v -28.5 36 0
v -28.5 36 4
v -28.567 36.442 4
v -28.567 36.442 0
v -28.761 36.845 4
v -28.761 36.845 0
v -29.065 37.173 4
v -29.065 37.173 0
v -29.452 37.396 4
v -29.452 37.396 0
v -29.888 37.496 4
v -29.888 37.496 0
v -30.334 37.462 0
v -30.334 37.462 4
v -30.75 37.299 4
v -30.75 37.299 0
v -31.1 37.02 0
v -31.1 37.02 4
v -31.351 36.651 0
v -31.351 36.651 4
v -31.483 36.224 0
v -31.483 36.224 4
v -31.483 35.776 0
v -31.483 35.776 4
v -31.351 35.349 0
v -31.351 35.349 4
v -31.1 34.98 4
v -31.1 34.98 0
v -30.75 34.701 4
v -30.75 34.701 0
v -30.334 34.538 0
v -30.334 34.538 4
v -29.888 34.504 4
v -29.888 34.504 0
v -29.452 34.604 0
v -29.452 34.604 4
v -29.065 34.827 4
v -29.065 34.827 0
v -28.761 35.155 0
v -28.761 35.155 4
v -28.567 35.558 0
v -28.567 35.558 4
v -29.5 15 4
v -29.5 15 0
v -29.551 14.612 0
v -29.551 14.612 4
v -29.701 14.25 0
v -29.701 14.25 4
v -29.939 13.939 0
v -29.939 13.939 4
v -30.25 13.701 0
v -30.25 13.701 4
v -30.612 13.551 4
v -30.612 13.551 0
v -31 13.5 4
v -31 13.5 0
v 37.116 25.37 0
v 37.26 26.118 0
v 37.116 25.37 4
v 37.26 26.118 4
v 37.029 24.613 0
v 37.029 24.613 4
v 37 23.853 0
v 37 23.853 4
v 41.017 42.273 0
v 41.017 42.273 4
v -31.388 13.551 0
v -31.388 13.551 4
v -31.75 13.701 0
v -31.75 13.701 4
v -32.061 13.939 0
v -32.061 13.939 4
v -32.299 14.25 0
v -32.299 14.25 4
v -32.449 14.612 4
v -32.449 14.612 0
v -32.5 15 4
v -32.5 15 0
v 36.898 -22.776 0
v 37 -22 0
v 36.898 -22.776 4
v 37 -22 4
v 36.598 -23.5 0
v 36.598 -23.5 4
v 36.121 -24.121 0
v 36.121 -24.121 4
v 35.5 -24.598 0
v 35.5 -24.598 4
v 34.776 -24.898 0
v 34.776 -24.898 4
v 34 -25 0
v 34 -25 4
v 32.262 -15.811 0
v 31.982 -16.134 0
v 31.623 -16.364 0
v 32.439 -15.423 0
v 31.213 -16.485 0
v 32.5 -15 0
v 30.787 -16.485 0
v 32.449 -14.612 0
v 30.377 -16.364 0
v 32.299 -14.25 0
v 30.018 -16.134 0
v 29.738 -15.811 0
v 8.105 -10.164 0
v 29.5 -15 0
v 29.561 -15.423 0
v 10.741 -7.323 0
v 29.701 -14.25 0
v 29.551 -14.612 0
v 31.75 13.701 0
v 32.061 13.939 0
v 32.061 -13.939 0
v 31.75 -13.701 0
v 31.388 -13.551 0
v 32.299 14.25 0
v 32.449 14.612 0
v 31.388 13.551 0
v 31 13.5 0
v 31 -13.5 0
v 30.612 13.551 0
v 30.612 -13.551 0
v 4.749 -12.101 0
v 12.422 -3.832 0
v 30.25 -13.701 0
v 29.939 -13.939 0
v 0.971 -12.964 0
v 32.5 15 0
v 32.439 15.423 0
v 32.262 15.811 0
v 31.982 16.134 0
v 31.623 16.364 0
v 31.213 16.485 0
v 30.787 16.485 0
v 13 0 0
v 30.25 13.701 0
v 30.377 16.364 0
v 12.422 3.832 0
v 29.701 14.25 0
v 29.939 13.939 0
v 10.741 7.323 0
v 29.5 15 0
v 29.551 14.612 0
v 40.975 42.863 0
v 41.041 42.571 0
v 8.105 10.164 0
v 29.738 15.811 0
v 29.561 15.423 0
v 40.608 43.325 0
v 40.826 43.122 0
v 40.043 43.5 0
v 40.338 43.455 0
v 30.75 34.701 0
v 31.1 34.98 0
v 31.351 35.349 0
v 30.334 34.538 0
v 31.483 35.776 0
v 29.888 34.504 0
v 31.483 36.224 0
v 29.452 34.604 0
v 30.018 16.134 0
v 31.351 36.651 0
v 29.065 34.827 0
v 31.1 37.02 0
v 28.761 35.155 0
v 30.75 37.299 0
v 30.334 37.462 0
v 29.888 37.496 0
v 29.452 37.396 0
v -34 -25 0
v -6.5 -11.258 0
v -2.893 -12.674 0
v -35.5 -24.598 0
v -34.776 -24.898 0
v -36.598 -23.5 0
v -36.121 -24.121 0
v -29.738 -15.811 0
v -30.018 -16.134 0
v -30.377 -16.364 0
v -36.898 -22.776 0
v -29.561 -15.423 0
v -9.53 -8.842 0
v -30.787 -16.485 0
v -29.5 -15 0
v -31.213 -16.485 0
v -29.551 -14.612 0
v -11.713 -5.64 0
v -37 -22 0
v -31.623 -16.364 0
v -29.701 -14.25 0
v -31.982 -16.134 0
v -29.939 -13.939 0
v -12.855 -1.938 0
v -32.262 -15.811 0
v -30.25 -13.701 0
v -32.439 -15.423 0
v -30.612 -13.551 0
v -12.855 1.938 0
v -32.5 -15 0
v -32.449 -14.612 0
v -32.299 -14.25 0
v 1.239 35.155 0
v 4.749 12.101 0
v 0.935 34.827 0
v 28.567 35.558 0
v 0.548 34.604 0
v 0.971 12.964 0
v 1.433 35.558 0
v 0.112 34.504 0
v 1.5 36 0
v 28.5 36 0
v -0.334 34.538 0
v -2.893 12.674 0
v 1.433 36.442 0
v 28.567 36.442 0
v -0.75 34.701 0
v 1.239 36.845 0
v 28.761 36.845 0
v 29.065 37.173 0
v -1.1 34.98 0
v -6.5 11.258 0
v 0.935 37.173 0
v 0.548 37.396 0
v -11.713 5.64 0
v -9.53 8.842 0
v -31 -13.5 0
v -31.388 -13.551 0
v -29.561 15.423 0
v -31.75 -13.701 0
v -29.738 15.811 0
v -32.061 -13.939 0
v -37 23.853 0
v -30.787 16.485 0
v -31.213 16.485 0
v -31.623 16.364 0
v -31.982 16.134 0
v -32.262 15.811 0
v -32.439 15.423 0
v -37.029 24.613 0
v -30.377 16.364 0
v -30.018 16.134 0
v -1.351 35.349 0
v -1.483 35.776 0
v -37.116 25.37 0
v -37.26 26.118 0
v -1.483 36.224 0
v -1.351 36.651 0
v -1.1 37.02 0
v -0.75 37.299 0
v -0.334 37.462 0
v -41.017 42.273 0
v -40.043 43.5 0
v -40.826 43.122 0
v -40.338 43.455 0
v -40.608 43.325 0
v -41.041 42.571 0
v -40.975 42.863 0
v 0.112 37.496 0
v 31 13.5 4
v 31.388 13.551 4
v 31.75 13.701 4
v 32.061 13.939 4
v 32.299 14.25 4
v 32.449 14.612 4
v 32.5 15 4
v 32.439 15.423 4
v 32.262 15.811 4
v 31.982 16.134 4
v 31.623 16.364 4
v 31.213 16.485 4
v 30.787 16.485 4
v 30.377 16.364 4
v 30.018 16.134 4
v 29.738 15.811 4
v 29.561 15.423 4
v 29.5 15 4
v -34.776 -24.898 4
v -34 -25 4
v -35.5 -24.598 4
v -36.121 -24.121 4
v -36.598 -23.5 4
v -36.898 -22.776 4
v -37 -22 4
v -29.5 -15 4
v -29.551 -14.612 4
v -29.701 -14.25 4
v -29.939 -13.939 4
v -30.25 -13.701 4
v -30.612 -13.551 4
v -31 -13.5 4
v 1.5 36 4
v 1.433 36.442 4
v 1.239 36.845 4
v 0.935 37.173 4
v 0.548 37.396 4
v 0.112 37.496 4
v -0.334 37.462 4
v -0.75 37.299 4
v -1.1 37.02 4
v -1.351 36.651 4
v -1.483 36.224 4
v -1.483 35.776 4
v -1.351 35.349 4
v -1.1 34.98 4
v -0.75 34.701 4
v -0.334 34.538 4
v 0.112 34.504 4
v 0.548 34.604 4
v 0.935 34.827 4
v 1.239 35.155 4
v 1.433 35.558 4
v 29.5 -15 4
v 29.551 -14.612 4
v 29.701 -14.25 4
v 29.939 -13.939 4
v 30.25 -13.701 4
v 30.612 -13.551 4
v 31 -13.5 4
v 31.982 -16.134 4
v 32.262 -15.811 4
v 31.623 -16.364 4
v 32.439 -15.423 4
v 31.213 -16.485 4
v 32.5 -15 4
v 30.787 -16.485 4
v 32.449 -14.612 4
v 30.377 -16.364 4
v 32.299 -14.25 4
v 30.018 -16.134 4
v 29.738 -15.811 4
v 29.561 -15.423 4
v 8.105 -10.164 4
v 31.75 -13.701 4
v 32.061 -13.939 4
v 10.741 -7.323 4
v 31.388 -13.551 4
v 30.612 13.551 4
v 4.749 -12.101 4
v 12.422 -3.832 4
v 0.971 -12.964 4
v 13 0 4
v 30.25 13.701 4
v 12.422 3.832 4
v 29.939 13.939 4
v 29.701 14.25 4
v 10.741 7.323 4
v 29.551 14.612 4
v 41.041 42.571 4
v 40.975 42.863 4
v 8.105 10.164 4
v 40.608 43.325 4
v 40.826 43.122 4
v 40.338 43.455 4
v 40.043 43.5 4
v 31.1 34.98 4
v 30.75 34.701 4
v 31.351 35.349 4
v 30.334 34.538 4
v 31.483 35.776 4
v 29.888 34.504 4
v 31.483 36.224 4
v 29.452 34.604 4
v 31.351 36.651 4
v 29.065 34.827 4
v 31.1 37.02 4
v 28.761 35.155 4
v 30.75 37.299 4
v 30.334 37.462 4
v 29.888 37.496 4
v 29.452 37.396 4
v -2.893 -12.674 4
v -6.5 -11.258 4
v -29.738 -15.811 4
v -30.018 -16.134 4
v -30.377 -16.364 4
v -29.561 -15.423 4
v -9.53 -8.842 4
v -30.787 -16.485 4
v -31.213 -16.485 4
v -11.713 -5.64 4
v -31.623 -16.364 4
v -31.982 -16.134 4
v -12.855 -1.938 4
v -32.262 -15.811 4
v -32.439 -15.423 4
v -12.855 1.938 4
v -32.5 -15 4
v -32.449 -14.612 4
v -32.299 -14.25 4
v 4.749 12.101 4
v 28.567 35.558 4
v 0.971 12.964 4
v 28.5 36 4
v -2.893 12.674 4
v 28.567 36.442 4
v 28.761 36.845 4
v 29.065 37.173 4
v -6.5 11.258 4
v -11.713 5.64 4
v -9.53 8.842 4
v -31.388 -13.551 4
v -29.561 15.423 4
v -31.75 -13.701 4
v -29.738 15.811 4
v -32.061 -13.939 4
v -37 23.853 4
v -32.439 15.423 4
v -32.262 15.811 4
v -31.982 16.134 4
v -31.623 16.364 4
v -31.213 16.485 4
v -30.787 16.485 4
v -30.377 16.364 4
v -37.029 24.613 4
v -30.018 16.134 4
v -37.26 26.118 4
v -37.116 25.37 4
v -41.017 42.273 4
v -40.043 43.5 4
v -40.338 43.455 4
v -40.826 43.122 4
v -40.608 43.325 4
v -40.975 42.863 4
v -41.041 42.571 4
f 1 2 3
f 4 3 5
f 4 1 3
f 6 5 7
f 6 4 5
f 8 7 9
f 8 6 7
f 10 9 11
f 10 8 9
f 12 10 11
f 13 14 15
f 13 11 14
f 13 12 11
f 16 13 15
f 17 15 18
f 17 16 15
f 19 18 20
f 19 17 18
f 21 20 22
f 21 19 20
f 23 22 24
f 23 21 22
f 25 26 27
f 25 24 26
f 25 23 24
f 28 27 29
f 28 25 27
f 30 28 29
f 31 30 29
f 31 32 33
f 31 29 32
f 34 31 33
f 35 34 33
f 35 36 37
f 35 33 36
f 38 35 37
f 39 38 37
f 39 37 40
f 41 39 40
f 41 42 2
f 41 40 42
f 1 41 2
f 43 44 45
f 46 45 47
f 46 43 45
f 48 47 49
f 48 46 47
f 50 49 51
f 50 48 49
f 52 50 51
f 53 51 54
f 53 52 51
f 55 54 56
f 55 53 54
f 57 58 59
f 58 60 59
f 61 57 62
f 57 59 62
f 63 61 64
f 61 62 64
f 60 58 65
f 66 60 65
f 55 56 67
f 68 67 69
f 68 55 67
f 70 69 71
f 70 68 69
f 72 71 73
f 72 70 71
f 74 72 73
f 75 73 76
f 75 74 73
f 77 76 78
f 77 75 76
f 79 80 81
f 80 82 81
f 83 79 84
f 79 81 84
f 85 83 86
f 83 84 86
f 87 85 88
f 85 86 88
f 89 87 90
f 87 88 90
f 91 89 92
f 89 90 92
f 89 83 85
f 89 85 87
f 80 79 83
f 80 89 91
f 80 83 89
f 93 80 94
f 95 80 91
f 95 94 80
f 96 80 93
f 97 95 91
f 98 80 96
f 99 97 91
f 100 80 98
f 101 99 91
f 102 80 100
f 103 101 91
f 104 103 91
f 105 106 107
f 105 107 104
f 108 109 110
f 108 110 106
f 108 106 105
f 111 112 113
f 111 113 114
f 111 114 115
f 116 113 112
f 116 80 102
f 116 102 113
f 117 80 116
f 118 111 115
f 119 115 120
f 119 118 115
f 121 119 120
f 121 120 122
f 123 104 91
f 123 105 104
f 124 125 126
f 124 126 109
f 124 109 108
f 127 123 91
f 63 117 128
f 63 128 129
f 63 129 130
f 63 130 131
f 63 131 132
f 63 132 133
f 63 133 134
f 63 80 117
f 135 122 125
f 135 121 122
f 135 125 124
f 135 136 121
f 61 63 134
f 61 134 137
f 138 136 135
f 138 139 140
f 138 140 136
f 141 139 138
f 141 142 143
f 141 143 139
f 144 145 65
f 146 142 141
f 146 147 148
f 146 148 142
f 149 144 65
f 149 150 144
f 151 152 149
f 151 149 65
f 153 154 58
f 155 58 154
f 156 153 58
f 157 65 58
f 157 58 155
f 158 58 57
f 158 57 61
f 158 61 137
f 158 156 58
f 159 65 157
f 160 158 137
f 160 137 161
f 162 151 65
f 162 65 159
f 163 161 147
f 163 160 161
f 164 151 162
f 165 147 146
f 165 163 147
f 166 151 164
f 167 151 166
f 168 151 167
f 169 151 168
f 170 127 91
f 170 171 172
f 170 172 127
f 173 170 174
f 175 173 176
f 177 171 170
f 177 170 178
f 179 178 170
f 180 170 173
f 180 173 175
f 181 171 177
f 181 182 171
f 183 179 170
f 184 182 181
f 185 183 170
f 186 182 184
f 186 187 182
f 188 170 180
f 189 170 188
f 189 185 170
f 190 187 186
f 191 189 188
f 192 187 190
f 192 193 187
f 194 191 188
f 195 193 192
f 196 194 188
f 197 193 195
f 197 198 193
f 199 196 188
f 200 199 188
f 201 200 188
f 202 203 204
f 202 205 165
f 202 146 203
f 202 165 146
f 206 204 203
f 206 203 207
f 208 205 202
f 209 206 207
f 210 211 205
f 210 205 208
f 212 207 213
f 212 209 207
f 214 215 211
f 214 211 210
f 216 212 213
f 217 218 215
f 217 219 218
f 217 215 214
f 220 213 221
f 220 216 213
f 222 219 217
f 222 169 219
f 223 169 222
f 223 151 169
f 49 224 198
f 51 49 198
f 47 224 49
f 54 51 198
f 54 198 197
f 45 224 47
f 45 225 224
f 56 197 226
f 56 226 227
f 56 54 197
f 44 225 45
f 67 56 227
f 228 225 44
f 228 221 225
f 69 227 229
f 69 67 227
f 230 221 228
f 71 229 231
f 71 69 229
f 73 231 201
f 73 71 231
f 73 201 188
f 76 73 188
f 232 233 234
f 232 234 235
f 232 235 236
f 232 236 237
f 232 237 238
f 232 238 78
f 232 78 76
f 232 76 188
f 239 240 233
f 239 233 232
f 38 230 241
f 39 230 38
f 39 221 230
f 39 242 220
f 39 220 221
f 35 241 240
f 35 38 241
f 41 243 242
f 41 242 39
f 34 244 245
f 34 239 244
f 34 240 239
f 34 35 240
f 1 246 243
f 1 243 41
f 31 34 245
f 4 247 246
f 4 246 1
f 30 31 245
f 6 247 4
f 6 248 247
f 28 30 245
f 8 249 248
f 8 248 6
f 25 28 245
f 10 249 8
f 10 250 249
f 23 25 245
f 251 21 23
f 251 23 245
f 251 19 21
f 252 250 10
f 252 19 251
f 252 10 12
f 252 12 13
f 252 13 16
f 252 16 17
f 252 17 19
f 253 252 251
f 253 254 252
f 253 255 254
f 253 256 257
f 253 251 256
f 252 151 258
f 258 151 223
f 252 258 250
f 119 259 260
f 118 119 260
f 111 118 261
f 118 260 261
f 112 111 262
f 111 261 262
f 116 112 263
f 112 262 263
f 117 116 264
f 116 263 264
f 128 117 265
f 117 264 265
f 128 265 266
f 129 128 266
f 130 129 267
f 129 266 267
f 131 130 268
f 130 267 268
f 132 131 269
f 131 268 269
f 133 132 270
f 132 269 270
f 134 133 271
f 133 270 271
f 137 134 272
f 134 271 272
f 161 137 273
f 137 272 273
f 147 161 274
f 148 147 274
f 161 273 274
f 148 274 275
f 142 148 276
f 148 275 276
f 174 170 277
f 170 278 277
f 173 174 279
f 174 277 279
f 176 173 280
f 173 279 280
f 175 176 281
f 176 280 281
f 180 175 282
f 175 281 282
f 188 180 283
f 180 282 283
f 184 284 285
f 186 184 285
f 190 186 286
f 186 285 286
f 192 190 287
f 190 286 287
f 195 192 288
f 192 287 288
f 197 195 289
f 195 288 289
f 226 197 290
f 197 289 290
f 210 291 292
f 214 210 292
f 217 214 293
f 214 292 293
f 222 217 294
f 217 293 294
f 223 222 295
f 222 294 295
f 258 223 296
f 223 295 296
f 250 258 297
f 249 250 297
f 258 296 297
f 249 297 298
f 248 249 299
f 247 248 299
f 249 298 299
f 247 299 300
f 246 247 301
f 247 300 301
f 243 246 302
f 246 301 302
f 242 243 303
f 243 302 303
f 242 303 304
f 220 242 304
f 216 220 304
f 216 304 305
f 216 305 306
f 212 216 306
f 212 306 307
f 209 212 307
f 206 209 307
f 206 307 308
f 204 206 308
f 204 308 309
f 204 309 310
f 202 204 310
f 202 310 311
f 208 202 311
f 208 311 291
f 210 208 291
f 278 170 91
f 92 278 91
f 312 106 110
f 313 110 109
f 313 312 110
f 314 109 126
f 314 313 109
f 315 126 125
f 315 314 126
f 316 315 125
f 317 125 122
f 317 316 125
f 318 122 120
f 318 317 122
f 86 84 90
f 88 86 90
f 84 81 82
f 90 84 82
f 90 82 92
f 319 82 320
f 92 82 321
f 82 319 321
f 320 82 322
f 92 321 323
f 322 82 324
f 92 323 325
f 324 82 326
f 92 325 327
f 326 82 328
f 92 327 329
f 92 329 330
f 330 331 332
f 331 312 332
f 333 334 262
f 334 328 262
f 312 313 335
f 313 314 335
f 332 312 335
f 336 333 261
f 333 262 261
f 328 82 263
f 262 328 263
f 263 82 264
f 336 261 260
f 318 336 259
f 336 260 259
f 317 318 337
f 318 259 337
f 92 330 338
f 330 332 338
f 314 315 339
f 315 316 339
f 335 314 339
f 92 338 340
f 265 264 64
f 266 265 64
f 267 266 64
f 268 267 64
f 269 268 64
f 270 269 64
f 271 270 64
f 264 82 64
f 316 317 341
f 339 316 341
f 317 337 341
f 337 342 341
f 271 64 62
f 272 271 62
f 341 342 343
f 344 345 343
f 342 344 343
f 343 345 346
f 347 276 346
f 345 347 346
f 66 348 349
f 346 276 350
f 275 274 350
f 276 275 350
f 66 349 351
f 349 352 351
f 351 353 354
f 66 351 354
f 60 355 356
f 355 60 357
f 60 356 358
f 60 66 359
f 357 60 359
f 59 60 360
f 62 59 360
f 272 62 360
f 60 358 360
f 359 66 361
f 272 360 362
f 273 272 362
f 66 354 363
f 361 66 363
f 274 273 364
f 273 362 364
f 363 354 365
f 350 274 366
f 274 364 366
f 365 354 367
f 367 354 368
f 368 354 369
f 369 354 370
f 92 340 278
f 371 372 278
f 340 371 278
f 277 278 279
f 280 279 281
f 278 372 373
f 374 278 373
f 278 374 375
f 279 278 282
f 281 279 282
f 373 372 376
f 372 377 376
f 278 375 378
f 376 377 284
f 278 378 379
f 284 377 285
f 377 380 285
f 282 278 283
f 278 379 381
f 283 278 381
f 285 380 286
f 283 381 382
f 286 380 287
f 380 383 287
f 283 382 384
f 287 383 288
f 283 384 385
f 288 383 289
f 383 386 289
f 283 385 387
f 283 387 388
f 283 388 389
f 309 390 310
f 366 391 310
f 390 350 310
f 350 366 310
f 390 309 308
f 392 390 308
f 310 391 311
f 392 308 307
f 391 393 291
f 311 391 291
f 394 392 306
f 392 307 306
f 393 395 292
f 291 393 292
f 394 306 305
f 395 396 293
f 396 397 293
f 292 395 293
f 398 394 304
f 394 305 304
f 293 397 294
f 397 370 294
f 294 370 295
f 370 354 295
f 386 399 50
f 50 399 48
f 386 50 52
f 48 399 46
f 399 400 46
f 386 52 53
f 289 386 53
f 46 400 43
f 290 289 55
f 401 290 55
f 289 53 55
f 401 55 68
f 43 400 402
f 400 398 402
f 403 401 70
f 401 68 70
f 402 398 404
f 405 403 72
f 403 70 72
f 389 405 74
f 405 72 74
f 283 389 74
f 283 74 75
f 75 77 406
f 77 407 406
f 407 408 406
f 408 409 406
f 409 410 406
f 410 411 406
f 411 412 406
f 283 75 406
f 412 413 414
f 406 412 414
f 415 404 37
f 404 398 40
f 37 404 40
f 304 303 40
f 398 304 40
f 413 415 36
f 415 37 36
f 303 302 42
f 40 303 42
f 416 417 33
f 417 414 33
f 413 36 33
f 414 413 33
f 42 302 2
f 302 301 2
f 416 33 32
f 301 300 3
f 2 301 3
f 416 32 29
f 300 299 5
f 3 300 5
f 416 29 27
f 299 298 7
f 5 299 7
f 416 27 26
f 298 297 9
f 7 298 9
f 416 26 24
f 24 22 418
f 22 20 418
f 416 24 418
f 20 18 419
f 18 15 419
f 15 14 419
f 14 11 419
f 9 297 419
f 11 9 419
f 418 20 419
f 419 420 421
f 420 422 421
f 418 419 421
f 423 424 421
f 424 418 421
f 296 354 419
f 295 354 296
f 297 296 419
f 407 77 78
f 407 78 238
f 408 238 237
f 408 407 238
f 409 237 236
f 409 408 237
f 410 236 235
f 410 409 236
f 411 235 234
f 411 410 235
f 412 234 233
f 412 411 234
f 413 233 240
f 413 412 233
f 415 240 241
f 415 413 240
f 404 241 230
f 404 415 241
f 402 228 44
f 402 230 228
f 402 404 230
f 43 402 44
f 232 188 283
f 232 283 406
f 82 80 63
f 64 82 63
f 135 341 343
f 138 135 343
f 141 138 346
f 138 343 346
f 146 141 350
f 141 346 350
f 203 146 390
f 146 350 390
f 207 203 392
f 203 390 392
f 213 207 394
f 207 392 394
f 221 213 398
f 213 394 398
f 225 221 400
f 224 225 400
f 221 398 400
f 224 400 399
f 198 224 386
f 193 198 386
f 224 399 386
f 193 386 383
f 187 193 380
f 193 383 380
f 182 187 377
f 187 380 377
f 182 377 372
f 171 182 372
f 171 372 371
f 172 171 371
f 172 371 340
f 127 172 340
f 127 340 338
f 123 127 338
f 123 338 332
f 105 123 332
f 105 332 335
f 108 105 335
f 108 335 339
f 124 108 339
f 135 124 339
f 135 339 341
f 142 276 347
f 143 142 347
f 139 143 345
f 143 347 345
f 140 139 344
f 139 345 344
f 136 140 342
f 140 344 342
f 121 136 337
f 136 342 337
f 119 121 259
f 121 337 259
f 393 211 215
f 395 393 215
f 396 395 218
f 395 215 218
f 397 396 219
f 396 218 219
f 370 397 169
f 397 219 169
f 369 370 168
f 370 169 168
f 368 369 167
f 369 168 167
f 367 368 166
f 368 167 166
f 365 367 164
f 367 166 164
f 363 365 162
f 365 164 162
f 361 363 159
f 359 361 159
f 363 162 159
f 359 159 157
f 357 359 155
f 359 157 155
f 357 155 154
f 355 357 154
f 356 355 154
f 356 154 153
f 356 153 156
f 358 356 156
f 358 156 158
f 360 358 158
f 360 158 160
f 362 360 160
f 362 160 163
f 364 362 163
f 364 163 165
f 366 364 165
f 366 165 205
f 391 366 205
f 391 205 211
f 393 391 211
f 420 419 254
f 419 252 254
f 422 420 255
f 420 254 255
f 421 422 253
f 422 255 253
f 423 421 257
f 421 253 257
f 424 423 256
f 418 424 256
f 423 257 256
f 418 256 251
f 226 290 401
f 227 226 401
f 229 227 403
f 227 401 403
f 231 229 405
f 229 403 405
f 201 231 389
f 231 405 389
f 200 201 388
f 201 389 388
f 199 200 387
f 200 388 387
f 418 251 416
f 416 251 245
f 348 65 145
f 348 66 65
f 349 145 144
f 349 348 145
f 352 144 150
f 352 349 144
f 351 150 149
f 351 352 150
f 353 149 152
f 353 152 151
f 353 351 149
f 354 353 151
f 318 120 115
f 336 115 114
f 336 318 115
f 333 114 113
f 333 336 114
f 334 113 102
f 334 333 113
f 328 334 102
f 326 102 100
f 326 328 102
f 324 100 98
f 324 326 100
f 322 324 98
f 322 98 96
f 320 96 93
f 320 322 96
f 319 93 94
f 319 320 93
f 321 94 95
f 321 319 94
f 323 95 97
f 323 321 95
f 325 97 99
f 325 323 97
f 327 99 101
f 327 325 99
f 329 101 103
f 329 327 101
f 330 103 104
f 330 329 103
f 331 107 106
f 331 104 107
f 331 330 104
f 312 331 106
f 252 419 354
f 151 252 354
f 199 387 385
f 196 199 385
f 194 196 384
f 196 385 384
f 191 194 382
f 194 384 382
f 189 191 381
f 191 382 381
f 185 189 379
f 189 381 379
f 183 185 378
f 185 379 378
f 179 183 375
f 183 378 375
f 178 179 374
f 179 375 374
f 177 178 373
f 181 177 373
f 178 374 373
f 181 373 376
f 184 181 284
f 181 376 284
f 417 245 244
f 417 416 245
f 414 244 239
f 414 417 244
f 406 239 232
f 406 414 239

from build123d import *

# Parameters (mm, degrees)
SKETCH_1_W            = 74
SKETCH_1_H            = 50
EXTRUDE_1_DEPTH       = 4
CUT_EXTRUDE_1_DEPTH   = 63.787339488
MIRROR_2_COPY_1_DEPTH = 63.787339488
SKETCH_3_R            = 13
CUT_EXTRUDE_2_DEPTH   = 63.787339488
FILLET_1_R            = 10
SKETCH_4_W            = 84
SKETCH_4_H            = 62
EXTRUDE_2_DEPTH       = 4
SKETCH_6_W            = 18
SKETCH_6_H            = 44
EXTRUDE_3_DEPTH       = 4
SKETCH_7_W            = 64
SKETCH_7_H            = 22
CUT_EXTRUDE_4_DEPTH   = 125.049385327
SKETCH_8_R            = 1.5
CUT_EXTRUDE_5_DEPTH   = 125.049385327
SKETCH_9_R            = 1.5
CUT_EXTRUDE_6_DEPTH   = 125.049385327
SKETCH_10_R           = 1.5
CUT_EXTRUDE_7_DEPTH   = 125.049385327
FILLET_2_R            = 3
SKETCH_11_W           = 20
SKETCH_11_H           = 18
CUT_EXTRUDE_8_DEPTH   = 125.049385327
FILLET_3_R            = 3
SKETCH_12_W           = 122.856865441
SKETCH_12_H           = 61.545901124
CUT_EXTRUDE_9_DEPTH   = 125.049385327
FILLET_4_R            = 3
FILLET_5_R            = 3
SKETCH_13_R           = 1.5
CUT_EXTRUDE_10_DEPTH  = 92.149602303
SKETCH_14_W           = 150.805924756
SKETCH_14_H           = 61.126695491
CUT_EXTRUDE_11_DEPTH  = 92.149602303
FILLET_6_R            = 1


with BuildPart() as part:
    # 草图1 → 凸台-拉伸1 (new body)
    with BuildSketch(Plane.XY):
        Polygon((37, 25), (42, 46.5), (-42, 46.5), (-37, 25), align=None)
        Rectangle(SKETCH_1_W, SKETCH_1_H)
    extrude(amount=EXTRUDE_1_DEPTH)

    # 草图2 → 切除-拉伸1 (cut, through all)
    with BuildSketch(Plane.XY.offset(4)):
        with BuildLine():
            ThreePointArc((29.5, 15), (29.939339828, 13.939339828), (31, 13.5))
            Line((31, 13.5), (31, 15))
            Line((31, 15), (29.5, 15))
        make_face()
        with BuildLine():
            Line((31, 15), (31, 13.5))
            ThreePointArc((31, 13.5), (32.060660172, 13.939339828), (32.5, 15))
            ThreePointArc((32.5, 15), (31, 16.5), (29.5, 15))
            Line((29.5, 15), (31, 15))
        make_face()
    cut_extrude_1 = extrude(amount=-CUT_EXTRUDE_1_DEPTH, mode=Mode.SUBTRACT)

    # 镜向1: 切除-拉伸1 across plane
    add(cut_extrude_1.mirror(Plane.ZX), mode=Mode.SUBTRACT)

    # 镜向2: 切除-拉伸1 across plane
    add(cut_extrude_1.mirror(Plane(origin=(0, 0, 0), x_dir=(0, 0, 1), z_dir=(1, 0, 0))), mode=Mode.SUBTRACT)

    # 镜向2 copy 1 sketch → 镜向2 copy 1 (cut, through all)
    with BuildSketch(Plane(origin=(0, 0, 4), x_dir=(-1, 0, 0), z_dir=(0, 0, 1))):
        with BuildLine():
            ThreePointArc((29.5, 15), (29.939339828, 13.939339828), (31, 13.5))
            Line((31, 13.5), (31, 15))
            Line((31, 15), (29.5, 15))
        make_face()
        with BuildLine():
            Line((31, 15), (31, 13.5))
            ThreePointArc((31, 13.5), (32.060660172, 13.939339828), (32.5, 15))
            ThreePointArc((32.5, 15), (31, 16.5), (29.5, 15))
            Line((29.5, 15), (31, 15))
        make_face()
    extrude(amount=-MIRROR_2_COPY_1_DEPTH, mode=Mode.SUBTRACT)

    # 草图3 → 切除-拉伸2 (cut, through all)
    with BuildSketch(Plane.XY.offset(4)):
        Circle(SKETCH_3_R)
    extrude(amount=-CUT_EXTRUDE_2_DEPTH, mode=Mode.SUBTRACT)

    # 圆角1
    fillet_1_edges = [part.edges().sort_by_distance(p)[0] for p in [
        (37, 25, 2),
        (-37, 25, 2),
    ]]
    fillet(fillet_1_edges, radius=FILLET_1_R)

    # 草图4 → 凸台-拉伸2 (add)
    with BuildSketch(Plane.XY.offset(4)):
        with Locations((0, 77.5)):
            Rectangle(SKETCH_4_W, SKETCH_4_H)
    extrude(amount=-EXTRUDE_2_DEPTH)

    # 草图6 → 凸台-拉伸3 (add)
    with BuildSketch(Plane.XY.offset(4)):
        with Locations((-51, 68.5)):
            Rectangle(SKETCH_6_W, SKETCH_6_H)
    extrude_3 = extrude(amount=-EXTRUDE_3_DEPTH)

    # 镜向4: 凸台-拉伸3 across plane
    add(extrude_3.mirror(Plane(origin=(0, 0, 0), x_dir=(0, 0, 1), z_dir=(1, 0, 0))))

    # 草图7 → 切除-拉伸4 (cut, through all)
    with BuildSketch(Plane.XY.offset(4)):
        with Locations((0, 69.5)):
            Rectangle(SKETCH_7_W, SKETCH_7_H)
    extrude(amount=-CUT_EXTRUDE_4_DEPTH, mode=Mode.SUBTRACT)

    # 草图8 → 切除-拉伸5 (cut, through all)
    with BuildSketch(Plane.XY.offset(4)):
        with Locations((0, 101)):
            Circle(SKETCH_8_R)
        with Locations((-24, 101)):
            Circle(SKETCH_8_R)
    cut_extrude_5 = extrude(amount=-CUT_EXTRUDE_5_DEPTH, mode=Mode.SUBTRACT)

    # 镜向5: 切除-拉伸5 across plane
    add(cut_extrude_5.mirror(Plane(origin=(0, 0, 0), x_dir=(0, 0, 1), z_dir=(1, 0, 0))), mode=Mode.SUBTRACT)

    # 草图9 → 切除-拉伸6 (cut, through all)
    with BuildSketch(Plane(origin=(0, 0, 0), x_dir=(-1, 0, 0), z_dir=(0, 0, -1))):
        with Locations((-52.5, 83.5)):
            Circle(SKETCH_9_R)
        with Locations((-52.5, 61)):
            Circle(SKETCH_9_R)
    cut_extrude_6 = extrude(amount=-CUT_EXTRUDE_6_DEPTH, mode=Mode.SUBTRACT)

    # 镜向6: 切除-拉伸6 across plane
    add(cut_extrude_6.mirror(Plane(origin=(0, 0, 0), x_dir=(0, 0, 1), z_dir=(1, 0, 0))), mode=Mode.SUBTRACT)

    # 草图10 → 切除-拉伸7 (cut, through all)
    with BuildSketch(Plane(origin=(0, 0, 0), x_dir=(-1, 0, 0), z_dir=(0, 0, -1))):
        with Locations((-30, 36)):
            Circle(SKETCH_10_R)
    cut_extrude_7 = extrude(amount=-CUT_EXTRUDE_7_DEPTH, mode=Mode.SUBTRACT)

    # 镜向7: 切除-拉伸7 across plane
    add(cut_extrude_7.mirror(Plane(origin=(0, 0, 0), x_dir=(0, 0, 1), z_dir=(1, 0, 0))), mode=Mode.SUBTRACT)

    # 圆角2
    fillet_2_edges = [part.edges().sort_by_distance(p)[0] for p in [
        (32, 80.5, 2),
        (32, 58.5, 2),
        (-32, 58.5, 2),
        (-32, 80.5, 2),
        (-42, 46.5, 2),
        (42, 46.5, 2),
        (-42, 90.5, 2),
        (42, 90.5, 2),
    ]]
    fillet(fillet_2_edges, radius=FILLET_2_R)

    # 草图11 → 切除-拉伸8 (cut, through all)
    with BuildSketch(Plane(origin=(0, 0, 0), x_dir=(-1, 0, 0), z_dir=(0, 0, -1))):
        with Locations((-50, 99.5)):
            Rectangle(SKETCH_11_W, SKETCH_11_H)
    cut_extrude_8 = extrude(amount=-CUT_EXTRUDE_8_DEPTH, mode=Mode.SUBTRACT)

    # 镜向8: 切除-拉伸8 across plane
    add(cut_extrude_8.mirror(Plane(origin=(0, 0, 0), x_dir=(0, 0, 1), z_dir=(1, 0, 0))), mode=Mode.SUBTRACT)

    # 圆角3
    fillet_3_edges = [part.edges().sort_by_distance(p)[0] for p in [
        (40, 90.5, 2),
        (-40, 90.5, 2),
    ]]
    fillet(fillet_3_edges, radius=FILLET_3_R)

    # 草图12 → 切除-拉伸9 (cut, through all)
    with BuildSketch(Plane(origin=(0, 0, 0), x_dir=(-1, 0, 0), z_dir=(0, 0, -1))):
        with Locations((1.42843272, 99.272950562)):
            Rectangle(SKETCH_12_W, SKETCH_12_H)
    extrude(amount=-CUT_EXTRUDE_9_DEPTH, mode=Mode.SUBTRACT)

    # 圆角4
    fillet_4_edges = [part.edges().sort_by_distance(p)[0] for p in [
        (-32, 68.5, 2),
        (32, 68.5, 2),
    ]]
    fillet(fillet_4_edges, radius=FILLET_4_R)

    # 圆角5
    fillet_5_edges = [part.edges().sort_by_distance(p)[0] for p in [
        (37, -25, 2),
        (-37, -25, 2),
    ]]
    fillet(fillet_5_edges, radius=FILLET_5_R)

    # 草图13 → 切除-拉伸10 (cut, through all)
    with BuildSketch(Plane.XY.offset(4)):
        with Locations((0, 36)):
            Circle(SKETCH_13_R)
    extrude(amount=-CUT_EXTRUDE_10_DEPTH, mode=Mode.SUBTRACT)

    # 草图14 → 切除-拉伸11 (cut, through all)
    with BuildSketch(Plane.XY.offset(4)):
        with Locations((-9.796052063, 74.063347746)):
            Rectangle(SKETCH_14_W, SKETCH_14_H)
    extrude(amount=-CUT_EXTRUDE_11_DEPTH, mode=Mode.SUBTRACT)

    # 圆角6
    fillet_6_edges = [part.edges().sort_by_distance(p)[0] for p in [
        (-41.302325581, 43.5, 2),
        (41.302325581, 43.5, 2),
    ]]
    fillet(fillet_6_edges, radius=FILLET_6_R)


solid = part.part
